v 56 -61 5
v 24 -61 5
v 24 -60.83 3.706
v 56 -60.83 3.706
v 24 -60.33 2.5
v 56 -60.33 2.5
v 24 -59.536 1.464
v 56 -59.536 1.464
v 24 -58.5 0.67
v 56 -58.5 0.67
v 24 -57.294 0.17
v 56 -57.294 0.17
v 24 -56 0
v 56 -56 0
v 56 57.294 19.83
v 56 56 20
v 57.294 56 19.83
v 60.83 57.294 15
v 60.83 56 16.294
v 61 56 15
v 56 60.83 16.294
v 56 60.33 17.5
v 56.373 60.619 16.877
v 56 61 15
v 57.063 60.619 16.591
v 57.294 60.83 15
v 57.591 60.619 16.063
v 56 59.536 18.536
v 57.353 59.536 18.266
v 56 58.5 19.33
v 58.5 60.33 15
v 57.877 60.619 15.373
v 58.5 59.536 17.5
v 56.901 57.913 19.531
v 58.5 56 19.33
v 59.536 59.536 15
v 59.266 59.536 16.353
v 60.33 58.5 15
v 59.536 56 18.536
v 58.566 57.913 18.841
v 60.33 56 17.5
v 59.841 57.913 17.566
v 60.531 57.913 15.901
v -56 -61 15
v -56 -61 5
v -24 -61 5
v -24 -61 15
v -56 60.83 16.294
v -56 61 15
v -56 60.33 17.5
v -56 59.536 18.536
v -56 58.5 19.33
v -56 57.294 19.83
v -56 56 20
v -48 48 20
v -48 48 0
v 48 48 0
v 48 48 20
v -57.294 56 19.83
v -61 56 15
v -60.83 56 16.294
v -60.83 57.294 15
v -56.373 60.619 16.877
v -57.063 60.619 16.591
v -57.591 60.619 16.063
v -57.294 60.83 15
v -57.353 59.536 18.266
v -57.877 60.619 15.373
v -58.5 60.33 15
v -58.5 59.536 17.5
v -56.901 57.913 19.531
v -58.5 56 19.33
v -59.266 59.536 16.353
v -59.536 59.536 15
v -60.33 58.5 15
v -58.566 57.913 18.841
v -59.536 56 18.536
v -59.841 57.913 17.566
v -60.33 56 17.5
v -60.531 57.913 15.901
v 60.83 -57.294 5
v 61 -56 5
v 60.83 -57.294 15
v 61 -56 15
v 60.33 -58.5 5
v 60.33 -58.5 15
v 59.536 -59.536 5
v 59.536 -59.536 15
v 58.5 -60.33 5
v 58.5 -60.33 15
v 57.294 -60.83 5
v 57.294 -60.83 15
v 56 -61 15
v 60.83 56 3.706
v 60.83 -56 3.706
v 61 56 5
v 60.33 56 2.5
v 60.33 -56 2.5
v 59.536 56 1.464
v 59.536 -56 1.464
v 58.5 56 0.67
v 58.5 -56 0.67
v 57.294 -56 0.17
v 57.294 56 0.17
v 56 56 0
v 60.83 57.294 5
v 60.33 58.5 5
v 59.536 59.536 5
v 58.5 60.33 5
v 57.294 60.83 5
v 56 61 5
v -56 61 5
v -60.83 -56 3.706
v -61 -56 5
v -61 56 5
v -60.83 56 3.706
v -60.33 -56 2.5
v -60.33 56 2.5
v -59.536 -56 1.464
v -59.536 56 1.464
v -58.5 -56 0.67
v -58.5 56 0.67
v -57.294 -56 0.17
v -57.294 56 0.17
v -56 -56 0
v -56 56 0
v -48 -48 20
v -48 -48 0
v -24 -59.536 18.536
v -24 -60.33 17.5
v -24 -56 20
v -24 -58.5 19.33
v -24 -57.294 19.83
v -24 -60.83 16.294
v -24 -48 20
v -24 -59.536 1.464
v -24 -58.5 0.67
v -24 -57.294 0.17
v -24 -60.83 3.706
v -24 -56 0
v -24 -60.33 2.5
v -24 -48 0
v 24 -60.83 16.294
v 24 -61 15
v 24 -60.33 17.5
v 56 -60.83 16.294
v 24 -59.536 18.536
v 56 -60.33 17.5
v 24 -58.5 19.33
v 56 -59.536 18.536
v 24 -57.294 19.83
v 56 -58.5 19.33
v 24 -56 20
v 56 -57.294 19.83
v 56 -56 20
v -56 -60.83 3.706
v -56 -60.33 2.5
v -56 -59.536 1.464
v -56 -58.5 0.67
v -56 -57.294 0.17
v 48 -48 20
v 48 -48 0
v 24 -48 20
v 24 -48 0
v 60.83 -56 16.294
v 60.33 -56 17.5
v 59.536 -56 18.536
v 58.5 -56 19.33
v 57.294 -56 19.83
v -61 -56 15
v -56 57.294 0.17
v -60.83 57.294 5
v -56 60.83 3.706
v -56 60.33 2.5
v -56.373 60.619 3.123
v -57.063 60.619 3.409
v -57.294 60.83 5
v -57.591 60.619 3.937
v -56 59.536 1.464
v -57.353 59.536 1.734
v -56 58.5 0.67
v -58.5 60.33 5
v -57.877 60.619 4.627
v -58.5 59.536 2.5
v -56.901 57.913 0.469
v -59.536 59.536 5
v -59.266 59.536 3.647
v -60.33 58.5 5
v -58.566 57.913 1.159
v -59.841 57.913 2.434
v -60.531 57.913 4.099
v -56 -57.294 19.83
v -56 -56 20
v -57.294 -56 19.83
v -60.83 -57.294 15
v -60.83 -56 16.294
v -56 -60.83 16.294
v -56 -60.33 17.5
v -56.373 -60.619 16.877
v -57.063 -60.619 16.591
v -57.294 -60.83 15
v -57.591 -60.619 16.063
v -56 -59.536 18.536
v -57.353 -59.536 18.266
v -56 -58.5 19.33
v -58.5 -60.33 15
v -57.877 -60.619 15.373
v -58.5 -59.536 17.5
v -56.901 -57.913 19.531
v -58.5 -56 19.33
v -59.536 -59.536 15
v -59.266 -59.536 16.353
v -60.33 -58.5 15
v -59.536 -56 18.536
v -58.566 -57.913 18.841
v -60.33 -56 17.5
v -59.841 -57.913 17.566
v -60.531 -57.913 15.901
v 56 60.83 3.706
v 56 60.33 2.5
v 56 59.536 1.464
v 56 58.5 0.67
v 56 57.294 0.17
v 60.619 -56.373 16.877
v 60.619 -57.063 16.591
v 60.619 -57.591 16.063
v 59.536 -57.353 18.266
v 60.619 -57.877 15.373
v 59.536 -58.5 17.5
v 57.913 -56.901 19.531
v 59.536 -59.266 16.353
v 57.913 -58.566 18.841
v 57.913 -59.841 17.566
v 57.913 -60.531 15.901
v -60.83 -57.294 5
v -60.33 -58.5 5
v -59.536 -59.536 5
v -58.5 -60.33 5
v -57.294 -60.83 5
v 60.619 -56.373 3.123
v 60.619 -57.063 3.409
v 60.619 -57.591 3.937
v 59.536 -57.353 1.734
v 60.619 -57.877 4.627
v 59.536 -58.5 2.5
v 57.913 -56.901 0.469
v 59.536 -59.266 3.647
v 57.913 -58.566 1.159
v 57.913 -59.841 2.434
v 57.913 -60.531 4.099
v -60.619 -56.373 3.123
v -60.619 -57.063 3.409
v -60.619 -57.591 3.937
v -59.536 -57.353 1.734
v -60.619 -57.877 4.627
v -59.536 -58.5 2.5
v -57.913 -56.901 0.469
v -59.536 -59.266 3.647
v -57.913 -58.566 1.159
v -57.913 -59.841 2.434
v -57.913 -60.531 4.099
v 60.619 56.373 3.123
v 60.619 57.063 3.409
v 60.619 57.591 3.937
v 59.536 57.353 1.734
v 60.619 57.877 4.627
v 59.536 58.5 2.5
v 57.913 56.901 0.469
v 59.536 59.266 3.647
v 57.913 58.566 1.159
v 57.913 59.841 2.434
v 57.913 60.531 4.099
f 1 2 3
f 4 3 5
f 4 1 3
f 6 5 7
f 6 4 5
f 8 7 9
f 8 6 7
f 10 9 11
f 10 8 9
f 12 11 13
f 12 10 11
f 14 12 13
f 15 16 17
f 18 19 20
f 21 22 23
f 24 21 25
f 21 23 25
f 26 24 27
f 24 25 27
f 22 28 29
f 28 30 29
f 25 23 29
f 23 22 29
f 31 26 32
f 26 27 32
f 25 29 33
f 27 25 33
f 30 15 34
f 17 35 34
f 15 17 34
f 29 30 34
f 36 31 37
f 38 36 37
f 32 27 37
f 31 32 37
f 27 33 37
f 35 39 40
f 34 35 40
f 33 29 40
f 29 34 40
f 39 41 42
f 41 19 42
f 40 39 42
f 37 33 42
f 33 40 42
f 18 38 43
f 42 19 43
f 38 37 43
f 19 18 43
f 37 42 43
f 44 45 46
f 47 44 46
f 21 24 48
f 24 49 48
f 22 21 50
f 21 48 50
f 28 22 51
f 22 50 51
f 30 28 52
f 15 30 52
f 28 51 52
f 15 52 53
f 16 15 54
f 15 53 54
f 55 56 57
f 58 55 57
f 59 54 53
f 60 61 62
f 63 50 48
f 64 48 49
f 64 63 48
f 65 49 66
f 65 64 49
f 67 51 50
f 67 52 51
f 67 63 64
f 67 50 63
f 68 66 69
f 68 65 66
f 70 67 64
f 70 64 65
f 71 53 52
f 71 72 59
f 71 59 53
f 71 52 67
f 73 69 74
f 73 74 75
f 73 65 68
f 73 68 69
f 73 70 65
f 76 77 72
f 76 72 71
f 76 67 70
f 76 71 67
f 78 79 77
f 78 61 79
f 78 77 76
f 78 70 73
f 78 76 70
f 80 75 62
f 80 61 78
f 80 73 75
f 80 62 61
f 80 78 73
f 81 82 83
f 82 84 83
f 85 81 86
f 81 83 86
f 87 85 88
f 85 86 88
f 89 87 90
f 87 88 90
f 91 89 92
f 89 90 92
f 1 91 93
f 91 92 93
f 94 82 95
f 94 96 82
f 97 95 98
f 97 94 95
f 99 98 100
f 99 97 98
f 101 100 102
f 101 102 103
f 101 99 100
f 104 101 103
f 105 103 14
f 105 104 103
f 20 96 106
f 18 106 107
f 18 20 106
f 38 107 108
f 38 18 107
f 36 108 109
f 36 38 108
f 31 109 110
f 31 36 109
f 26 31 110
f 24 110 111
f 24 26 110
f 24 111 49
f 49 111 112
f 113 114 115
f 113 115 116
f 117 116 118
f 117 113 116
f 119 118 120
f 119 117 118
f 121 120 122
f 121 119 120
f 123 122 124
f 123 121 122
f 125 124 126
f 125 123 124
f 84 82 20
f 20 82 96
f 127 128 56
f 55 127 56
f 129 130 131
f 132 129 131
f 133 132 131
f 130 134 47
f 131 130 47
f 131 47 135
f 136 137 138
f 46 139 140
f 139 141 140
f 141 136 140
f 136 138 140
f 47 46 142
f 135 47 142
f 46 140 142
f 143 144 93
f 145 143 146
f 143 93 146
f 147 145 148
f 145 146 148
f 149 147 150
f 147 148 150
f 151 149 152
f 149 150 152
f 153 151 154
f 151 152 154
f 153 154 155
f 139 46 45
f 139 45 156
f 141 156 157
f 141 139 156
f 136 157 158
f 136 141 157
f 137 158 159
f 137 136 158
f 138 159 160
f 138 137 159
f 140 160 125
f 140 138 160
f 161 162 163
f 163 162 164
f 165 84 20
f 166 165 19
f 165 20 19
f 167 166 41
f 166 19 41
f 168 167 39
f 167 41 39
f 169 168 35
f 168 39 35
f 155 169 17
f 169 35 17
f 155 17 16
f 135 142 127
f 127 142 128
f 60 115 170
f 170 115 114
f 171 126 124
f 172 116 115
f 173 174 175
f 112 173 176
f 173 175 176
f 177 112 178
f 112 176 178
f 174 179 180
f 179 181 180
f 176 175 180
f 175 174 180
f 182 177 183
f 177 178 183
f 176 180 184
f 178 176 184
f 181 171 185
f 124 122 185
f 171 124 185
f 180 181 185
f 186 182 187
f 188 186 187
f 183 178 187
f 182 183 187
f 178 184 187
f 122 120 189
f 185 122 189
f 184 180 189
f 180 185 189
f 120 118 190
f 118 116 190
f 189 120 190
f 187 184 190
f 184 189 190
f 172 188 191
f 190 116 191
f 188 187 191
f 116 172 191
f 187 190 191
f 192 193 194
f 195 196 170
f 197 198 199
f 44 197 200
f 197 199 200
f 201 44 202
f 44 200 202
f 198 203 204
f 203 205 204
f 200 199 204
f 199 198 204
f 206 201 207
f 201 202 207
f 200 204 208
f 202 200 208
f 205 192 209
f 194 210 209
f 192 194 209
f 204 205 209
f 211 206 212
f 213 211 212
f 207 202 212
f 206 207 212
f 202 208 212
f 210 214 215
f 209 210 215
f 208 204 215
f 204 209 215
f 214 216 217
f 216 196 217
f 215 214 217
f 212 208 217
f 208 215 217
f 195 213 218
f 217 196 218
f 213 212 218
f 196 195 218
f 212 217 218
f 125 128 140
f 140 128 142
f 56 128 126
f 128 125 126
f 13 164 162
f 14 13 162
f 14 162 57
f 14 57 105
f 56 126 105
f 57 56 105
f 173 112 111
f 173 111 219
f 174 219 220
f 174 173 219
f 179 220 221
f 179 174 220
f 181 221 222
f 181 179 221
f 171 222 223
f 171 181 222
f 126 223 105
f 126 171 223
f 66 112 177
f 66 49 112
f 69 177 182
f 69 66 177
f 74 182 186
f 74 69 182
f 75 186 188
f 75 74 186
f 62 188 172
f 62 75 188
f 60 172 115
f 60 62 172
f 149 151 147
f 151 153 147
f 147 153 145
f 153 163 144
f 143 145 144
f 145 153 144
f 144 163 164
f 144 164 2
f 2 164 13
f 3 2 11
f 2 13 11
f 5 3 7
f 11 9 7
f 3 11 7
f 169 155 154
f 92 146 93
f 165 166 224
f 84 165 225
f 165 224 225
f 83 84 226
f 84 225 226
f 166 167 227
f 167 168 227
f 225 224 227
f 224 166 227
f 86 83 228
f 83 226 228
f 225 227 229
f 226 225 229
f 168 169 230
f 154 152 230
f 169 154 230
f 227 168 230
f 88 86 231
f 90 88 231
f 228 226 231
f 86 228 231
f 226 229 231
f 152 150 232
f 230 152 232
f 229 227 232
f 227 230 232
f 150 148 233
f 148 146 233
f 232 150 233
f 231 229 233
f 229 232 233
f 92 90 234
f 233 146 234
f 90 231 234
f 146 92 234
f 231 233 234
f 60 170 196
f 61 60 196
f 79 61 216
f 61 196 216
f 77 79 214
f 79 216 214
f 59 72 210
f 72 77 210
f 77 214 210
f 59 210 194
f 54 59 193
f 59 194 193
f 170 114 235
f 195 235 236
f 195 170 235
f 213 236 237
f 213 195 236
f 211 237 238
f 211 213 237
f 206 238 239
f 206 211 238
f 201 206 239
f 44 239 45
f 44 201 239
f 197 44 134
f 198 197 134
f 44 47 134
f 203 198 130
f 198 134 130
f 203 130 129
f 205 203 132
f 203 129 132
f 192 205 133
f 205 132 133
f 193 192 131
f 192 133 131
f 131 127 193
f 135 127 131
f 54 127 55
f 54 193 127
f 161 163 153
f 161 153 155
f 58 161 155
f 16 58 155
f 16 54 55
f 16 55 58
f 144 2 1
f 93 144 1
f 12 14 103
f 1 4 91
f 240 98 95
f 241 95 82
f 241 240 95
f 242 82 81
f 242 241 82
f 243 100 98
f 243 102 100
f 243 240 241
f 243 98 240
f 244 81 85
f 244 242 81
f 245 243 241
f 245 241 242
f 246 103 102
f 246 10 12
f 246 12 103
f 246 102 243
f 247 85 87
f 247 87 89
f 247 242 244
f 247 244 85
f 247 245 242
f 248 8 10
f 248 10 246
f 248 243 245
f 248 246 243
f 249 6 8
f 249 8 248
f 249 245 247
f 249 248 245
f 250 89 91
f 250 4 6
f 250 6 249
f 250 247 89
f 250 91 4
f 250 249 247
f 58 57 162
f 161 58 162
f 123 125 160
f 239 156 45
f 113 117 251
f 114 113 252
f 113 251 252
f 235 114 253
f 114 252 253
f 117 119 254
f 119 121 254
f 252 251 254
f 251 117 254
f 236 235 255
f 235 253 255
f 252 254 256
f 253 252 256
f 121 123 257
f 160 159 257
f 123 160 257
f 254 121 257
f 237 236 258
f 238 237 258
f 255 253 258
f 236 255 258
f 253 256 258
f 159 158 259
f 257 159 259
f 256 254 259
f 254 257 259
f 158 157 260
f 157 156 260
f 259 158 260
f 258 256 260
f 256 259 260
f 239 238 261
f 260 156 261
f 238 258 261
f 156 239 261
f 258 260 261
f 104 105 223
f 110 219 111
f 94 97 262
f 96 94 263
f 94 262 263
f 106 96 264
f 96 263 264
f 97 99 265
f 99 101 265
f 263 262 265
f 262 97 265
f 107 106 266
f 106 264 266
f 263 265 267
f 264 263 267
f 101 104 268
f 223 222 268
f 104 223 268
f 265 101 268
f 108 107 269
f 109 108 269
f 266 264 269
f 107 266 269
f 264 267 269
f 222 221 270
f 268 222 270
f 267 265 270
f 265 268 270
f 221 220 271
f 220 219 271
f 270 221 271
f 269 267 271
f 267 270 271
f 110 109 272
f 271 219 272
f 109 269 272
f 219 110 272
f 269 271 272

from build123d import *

# Parameters (mm, degrees)
F1_DEPTH = 20
F2_R     = 5


with BuildPart() as f1:
    # F0 (on Top) → F1 (new body)
    with BuildSketch(Plane.XY):
        Polygon((61, -61), (61, 61), (-61, 61), (-61, -61), (-24, -61), (-24, -48), (-48, -48), (-48, 48), (48, 48), (48, -48), (24, -48), (24, -61), align=None)
    extrude(amount=F1_DEPTH)

    # F2
    f2_edges = [f1.edges().sort_by_distance(p)[0] for p in [
        (-61, 0, 20),
        (-42.5, -61, 20),
        (42.5, -61, 20),
        (61, 0, 20),
        (0, 61, 20),
        (42.5, -61, 0),
        (-42.5, -61, 0),
        (-61, 0, 0),
        (0, 61, 0),
        (61, 0, 0),
        (61, -61, 10),
        (-61, -61, 10),
        (61, 61, 10),
        (-61, 61, 10),
    ]]
    fillet(f2_edges, radius=F2_R)


solid = f1.part
